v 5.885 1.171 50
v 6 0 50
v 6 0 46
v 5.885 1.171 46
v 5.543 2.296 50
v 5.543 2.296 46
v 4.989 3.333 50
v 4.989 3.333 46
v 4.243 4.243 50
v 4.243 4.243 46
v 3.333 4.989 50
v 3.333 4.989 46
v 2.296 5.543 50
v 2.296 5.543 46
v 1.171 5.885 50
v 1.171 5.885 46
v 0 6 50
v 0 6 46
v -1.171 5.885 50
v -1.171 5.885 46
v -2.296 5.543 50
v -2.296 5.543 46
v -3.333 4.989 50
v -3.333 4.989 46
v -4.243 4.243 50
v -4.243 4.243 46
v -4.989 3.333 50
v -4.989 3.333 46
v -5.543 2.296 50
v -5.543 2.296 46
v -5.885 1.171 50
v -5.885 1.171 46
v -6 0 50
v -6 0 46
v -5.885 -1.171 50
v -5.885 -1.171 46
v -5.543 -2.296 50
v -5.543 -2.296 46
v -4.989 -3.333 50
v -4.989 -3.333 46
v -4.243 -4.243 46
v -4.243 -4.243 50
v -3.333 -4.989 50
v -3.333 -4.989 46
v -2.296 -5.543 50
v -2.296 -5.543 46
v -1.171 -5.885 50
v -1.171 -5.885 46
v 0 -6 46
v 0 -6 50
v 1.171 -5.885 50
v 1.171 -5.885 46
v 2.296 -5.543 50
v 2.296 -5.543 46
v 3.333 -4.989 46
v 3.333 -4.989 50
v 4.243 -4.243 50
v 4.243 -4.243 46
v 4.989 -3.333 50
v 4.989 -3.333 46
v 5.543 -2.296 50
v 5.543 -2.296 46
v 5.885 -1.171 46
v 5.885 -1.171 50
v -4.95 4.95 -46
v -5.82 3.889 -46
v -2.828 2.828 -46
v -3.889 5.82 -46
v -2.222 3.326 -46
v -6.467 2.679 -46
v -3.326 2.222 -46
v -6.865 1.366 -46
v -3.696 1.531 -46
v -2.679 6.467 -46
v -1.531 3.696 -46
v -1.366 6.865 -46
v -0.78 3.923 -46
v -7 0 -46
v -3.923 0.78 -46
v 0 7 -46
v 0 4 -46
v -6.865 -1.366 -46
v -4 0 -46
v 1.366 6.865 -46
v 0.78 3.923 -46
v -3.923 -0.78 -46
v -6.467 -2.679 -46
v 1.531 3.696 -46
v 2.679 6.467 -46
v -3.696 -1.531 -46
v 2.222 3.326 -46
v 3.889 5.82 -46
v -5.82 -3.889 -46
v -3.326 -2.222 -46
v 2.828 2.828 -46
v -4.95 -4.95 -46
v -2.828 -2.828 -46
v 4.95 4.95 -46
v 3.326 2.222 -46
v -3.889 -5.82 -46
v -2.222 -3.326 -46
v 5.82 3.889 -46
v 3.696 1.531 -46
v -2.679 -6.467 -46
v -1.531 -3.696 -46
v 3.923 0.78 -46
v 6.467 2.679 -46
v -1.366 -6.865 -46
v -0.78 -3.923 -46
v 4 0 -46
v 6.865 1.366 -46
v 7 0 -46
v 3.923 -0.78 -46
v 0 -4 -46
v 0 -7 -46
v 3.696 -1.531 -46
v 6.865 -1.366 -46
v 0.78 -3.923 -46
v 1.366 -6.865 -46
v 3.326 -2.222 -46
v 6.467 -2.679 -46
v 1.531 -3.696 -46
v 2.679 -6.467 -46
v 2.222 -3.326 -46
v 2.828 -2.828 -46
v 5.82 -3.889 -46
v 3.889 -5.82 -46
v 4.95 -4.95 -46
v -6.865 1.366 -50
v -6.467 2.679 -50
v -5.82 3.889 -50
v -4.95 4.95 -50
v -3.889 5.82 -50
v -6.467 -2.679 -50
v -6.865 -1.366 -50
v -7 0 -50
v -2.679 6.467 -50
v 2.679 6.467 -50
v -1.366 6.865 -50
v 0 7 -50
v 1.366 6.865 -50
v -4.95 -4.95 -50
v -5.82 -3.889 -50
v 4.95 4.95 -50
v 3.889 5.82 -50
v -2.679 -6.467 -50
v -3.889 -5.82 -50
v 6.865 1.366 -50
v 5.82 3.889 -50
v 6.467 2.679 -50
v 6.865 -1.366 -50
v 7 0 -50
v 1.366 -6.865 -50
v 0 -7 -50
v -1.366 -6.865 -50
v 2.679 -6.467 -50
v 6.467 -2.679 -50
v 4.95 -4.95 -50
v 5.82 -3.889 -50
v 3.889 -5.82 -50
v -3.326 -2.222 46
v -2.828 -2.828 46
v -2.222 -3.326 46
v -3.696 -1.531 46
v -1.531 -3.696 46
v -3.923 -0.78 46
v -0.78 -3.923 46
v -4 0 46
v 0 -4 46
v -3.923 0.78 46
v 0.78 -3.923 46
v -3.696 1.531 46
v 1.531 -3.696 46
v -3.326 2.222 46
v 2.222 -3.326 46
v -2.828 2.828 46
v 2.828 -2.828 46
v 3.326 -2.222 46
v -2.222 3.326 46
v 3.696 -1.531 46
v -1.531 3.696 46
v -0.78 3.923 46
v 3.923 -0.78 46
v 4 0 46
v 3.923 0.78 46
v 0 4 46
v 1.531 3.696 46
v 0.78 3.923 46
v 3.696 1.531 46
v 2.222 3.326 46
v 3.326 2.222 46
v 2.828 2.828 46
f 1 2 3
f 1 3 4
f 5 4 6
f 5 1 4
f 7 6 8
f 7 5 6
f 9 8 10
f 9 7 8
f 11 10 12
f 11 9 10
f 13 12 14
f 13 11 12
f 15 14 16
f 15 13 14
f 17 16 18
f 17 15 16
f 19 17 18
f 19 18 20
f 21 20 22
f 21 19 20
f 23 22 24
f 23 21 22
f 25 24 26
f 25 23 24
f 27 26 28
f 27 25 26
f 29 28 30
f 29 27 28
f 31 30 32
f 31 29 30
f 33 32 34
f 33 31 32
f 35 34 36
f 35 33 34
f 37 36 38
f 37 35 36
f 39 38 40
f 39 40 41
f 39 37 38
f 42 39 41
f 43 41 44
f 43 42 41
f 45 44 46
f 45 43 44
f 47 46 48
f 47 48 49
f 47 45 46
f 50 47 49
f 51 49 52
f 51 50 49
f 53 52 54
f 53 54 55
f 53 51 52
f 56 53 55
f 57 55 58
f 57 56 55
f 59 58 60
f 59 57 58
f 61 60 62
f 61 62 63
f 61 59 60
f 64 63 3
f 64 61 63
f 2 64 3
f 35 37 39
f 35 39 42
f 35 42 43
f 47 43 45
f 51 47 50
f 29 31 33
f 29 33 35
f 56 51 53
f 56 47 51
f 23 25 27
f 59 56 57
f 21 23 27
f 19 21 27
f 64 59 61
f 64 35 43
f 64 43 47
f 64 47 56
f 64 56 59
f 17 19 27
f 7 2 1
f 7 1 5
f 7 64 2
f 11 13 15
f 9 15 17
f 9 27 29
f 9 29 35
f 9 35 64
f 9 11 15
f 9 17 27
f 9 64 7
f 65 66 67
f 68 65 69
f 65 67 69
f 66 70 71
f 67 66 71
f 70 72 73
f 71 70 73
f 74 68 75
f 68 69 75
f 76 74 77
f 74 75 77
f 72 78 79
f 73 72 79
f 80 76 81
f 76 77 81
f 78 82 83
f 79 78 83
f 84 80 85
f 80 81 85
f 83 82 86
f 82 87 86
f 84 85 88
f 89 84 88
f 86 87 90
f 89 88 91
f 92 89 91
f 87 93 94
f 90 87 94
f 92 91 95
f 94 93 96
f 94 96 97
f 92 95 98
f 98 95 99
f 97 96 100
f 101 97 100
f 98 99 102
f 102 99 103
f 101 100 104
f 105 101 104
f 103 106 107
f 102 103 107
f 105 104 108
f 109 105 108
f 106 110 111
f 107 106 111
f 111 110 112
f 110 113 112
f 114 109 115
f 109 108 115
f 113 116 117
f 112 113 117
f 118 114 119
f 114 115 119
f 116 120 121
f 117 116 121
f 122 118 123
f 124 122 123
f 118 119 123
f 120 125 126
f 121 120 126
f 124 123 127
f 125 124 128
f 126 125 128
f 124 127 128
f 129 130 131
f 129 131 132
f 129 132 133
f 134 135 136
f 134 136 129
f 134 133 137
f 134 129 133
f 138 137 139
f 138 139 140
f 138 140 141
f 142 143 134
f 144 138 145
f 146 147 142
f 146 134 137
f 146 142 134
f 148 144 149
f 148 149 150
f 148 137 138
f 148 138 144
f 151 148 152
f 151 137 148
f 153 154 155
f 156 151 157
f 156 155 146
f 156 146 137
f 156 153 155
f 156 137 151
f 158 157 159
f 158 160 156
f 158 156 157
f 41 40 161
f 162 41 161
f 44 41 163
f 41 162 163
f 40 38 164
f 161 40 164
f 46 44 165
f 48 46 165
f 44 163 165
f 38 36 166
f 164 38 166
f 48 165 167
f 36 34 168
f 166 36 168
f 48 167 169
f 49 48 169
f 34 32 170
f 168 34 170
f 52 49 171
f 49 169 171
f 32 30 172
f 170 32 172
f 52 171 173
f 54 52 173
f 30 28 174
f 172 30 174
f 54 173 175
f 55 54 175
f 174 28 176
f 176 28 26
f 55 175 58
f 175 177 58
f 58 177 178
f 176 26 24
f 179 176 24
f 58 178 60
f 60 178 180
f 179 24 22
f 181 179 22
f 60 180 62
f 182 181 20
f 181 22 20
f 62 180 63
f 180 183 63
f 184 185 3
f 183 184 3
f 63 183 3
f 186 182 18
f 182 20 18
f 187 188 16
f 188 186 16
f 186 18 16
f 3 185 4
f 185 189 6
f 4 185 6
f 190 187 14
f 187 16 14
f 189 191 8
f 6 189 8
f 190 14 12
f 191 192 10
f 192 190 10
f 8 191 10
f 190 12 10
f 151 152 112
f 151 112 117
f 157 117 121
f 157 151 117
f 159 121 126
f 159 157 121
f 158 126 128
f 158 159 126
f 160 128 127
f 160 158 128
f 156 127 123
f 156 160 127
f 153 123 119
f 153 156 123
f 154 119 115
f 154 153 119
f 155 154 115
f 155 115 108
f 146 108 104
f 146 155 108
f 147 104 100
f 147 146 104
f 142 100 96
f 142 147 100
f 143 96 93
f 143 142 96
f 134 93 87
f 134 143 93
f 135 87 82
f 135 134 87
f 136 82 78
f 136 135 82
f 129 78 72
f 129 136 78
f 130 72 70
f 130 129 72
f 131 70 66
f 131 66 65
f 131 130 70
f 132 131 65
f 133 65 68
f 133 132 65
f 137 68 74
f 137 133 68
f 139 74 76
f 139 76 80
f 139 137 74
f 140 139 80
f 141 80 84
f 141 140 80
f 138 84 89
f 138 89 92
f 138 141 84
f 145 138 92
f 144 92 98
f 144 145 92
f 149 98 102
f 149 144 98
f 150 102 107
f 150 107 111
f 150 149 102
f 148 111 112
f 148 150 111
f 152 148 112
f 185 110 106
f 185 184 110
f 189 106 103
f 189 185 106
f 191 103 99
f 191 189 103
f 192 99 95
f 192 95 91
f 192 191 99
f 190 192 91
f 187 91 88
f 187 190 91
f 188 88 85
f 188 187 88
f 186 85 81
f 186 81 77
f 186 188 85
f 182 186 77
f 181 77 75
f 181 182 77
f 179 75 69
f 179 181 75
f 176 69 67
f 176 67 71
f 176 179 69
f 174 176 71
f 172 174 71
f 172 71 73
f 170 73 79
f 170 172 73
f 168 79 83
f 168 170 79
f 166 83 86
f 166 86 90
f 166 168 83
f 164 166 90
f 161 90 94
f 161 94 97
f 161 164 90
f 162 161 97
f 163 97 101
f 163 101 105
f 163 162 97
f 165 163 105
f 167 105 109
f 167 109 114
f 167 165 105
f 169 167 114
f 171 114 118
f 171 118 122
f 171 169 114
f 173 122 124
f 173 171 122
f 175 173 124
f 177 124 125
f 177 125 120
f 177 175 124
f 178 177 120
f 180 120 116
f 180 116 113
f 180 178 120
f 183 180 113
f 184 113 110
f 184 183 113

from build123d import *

# Parameters (mm, degrees)
F0_R     = 4
F1_DEPTH = 50
F2_R     = 6
F3_DEPTH = 4
F4_R     = 7
F5_DEPTH = 4


with BuildPart() as f1:
    # F0 (on Top) → F1 (new body, symmetric)
    with BuildSketch(Plane.XY):
        Circle(F0_R)
    extrude(amount=F1_DEPTH, both=True)

    # F2 (on face) → F3 (join)
    with BuildSketch(Plane.XY.offset(50)):
        Circle(F2_R)
    extrude(amount=-F3_DEPTH)

    # F4 (on face) → F5 (join)
    with BuildSketch(Plane(origin=(0, 0, -50), x_dir=(1, 0, 0), z_dir=(0, 0, -1))):
        Circle(F4_R)
    extrude(amount=-F5_DEPTH)


solid = f1.part
